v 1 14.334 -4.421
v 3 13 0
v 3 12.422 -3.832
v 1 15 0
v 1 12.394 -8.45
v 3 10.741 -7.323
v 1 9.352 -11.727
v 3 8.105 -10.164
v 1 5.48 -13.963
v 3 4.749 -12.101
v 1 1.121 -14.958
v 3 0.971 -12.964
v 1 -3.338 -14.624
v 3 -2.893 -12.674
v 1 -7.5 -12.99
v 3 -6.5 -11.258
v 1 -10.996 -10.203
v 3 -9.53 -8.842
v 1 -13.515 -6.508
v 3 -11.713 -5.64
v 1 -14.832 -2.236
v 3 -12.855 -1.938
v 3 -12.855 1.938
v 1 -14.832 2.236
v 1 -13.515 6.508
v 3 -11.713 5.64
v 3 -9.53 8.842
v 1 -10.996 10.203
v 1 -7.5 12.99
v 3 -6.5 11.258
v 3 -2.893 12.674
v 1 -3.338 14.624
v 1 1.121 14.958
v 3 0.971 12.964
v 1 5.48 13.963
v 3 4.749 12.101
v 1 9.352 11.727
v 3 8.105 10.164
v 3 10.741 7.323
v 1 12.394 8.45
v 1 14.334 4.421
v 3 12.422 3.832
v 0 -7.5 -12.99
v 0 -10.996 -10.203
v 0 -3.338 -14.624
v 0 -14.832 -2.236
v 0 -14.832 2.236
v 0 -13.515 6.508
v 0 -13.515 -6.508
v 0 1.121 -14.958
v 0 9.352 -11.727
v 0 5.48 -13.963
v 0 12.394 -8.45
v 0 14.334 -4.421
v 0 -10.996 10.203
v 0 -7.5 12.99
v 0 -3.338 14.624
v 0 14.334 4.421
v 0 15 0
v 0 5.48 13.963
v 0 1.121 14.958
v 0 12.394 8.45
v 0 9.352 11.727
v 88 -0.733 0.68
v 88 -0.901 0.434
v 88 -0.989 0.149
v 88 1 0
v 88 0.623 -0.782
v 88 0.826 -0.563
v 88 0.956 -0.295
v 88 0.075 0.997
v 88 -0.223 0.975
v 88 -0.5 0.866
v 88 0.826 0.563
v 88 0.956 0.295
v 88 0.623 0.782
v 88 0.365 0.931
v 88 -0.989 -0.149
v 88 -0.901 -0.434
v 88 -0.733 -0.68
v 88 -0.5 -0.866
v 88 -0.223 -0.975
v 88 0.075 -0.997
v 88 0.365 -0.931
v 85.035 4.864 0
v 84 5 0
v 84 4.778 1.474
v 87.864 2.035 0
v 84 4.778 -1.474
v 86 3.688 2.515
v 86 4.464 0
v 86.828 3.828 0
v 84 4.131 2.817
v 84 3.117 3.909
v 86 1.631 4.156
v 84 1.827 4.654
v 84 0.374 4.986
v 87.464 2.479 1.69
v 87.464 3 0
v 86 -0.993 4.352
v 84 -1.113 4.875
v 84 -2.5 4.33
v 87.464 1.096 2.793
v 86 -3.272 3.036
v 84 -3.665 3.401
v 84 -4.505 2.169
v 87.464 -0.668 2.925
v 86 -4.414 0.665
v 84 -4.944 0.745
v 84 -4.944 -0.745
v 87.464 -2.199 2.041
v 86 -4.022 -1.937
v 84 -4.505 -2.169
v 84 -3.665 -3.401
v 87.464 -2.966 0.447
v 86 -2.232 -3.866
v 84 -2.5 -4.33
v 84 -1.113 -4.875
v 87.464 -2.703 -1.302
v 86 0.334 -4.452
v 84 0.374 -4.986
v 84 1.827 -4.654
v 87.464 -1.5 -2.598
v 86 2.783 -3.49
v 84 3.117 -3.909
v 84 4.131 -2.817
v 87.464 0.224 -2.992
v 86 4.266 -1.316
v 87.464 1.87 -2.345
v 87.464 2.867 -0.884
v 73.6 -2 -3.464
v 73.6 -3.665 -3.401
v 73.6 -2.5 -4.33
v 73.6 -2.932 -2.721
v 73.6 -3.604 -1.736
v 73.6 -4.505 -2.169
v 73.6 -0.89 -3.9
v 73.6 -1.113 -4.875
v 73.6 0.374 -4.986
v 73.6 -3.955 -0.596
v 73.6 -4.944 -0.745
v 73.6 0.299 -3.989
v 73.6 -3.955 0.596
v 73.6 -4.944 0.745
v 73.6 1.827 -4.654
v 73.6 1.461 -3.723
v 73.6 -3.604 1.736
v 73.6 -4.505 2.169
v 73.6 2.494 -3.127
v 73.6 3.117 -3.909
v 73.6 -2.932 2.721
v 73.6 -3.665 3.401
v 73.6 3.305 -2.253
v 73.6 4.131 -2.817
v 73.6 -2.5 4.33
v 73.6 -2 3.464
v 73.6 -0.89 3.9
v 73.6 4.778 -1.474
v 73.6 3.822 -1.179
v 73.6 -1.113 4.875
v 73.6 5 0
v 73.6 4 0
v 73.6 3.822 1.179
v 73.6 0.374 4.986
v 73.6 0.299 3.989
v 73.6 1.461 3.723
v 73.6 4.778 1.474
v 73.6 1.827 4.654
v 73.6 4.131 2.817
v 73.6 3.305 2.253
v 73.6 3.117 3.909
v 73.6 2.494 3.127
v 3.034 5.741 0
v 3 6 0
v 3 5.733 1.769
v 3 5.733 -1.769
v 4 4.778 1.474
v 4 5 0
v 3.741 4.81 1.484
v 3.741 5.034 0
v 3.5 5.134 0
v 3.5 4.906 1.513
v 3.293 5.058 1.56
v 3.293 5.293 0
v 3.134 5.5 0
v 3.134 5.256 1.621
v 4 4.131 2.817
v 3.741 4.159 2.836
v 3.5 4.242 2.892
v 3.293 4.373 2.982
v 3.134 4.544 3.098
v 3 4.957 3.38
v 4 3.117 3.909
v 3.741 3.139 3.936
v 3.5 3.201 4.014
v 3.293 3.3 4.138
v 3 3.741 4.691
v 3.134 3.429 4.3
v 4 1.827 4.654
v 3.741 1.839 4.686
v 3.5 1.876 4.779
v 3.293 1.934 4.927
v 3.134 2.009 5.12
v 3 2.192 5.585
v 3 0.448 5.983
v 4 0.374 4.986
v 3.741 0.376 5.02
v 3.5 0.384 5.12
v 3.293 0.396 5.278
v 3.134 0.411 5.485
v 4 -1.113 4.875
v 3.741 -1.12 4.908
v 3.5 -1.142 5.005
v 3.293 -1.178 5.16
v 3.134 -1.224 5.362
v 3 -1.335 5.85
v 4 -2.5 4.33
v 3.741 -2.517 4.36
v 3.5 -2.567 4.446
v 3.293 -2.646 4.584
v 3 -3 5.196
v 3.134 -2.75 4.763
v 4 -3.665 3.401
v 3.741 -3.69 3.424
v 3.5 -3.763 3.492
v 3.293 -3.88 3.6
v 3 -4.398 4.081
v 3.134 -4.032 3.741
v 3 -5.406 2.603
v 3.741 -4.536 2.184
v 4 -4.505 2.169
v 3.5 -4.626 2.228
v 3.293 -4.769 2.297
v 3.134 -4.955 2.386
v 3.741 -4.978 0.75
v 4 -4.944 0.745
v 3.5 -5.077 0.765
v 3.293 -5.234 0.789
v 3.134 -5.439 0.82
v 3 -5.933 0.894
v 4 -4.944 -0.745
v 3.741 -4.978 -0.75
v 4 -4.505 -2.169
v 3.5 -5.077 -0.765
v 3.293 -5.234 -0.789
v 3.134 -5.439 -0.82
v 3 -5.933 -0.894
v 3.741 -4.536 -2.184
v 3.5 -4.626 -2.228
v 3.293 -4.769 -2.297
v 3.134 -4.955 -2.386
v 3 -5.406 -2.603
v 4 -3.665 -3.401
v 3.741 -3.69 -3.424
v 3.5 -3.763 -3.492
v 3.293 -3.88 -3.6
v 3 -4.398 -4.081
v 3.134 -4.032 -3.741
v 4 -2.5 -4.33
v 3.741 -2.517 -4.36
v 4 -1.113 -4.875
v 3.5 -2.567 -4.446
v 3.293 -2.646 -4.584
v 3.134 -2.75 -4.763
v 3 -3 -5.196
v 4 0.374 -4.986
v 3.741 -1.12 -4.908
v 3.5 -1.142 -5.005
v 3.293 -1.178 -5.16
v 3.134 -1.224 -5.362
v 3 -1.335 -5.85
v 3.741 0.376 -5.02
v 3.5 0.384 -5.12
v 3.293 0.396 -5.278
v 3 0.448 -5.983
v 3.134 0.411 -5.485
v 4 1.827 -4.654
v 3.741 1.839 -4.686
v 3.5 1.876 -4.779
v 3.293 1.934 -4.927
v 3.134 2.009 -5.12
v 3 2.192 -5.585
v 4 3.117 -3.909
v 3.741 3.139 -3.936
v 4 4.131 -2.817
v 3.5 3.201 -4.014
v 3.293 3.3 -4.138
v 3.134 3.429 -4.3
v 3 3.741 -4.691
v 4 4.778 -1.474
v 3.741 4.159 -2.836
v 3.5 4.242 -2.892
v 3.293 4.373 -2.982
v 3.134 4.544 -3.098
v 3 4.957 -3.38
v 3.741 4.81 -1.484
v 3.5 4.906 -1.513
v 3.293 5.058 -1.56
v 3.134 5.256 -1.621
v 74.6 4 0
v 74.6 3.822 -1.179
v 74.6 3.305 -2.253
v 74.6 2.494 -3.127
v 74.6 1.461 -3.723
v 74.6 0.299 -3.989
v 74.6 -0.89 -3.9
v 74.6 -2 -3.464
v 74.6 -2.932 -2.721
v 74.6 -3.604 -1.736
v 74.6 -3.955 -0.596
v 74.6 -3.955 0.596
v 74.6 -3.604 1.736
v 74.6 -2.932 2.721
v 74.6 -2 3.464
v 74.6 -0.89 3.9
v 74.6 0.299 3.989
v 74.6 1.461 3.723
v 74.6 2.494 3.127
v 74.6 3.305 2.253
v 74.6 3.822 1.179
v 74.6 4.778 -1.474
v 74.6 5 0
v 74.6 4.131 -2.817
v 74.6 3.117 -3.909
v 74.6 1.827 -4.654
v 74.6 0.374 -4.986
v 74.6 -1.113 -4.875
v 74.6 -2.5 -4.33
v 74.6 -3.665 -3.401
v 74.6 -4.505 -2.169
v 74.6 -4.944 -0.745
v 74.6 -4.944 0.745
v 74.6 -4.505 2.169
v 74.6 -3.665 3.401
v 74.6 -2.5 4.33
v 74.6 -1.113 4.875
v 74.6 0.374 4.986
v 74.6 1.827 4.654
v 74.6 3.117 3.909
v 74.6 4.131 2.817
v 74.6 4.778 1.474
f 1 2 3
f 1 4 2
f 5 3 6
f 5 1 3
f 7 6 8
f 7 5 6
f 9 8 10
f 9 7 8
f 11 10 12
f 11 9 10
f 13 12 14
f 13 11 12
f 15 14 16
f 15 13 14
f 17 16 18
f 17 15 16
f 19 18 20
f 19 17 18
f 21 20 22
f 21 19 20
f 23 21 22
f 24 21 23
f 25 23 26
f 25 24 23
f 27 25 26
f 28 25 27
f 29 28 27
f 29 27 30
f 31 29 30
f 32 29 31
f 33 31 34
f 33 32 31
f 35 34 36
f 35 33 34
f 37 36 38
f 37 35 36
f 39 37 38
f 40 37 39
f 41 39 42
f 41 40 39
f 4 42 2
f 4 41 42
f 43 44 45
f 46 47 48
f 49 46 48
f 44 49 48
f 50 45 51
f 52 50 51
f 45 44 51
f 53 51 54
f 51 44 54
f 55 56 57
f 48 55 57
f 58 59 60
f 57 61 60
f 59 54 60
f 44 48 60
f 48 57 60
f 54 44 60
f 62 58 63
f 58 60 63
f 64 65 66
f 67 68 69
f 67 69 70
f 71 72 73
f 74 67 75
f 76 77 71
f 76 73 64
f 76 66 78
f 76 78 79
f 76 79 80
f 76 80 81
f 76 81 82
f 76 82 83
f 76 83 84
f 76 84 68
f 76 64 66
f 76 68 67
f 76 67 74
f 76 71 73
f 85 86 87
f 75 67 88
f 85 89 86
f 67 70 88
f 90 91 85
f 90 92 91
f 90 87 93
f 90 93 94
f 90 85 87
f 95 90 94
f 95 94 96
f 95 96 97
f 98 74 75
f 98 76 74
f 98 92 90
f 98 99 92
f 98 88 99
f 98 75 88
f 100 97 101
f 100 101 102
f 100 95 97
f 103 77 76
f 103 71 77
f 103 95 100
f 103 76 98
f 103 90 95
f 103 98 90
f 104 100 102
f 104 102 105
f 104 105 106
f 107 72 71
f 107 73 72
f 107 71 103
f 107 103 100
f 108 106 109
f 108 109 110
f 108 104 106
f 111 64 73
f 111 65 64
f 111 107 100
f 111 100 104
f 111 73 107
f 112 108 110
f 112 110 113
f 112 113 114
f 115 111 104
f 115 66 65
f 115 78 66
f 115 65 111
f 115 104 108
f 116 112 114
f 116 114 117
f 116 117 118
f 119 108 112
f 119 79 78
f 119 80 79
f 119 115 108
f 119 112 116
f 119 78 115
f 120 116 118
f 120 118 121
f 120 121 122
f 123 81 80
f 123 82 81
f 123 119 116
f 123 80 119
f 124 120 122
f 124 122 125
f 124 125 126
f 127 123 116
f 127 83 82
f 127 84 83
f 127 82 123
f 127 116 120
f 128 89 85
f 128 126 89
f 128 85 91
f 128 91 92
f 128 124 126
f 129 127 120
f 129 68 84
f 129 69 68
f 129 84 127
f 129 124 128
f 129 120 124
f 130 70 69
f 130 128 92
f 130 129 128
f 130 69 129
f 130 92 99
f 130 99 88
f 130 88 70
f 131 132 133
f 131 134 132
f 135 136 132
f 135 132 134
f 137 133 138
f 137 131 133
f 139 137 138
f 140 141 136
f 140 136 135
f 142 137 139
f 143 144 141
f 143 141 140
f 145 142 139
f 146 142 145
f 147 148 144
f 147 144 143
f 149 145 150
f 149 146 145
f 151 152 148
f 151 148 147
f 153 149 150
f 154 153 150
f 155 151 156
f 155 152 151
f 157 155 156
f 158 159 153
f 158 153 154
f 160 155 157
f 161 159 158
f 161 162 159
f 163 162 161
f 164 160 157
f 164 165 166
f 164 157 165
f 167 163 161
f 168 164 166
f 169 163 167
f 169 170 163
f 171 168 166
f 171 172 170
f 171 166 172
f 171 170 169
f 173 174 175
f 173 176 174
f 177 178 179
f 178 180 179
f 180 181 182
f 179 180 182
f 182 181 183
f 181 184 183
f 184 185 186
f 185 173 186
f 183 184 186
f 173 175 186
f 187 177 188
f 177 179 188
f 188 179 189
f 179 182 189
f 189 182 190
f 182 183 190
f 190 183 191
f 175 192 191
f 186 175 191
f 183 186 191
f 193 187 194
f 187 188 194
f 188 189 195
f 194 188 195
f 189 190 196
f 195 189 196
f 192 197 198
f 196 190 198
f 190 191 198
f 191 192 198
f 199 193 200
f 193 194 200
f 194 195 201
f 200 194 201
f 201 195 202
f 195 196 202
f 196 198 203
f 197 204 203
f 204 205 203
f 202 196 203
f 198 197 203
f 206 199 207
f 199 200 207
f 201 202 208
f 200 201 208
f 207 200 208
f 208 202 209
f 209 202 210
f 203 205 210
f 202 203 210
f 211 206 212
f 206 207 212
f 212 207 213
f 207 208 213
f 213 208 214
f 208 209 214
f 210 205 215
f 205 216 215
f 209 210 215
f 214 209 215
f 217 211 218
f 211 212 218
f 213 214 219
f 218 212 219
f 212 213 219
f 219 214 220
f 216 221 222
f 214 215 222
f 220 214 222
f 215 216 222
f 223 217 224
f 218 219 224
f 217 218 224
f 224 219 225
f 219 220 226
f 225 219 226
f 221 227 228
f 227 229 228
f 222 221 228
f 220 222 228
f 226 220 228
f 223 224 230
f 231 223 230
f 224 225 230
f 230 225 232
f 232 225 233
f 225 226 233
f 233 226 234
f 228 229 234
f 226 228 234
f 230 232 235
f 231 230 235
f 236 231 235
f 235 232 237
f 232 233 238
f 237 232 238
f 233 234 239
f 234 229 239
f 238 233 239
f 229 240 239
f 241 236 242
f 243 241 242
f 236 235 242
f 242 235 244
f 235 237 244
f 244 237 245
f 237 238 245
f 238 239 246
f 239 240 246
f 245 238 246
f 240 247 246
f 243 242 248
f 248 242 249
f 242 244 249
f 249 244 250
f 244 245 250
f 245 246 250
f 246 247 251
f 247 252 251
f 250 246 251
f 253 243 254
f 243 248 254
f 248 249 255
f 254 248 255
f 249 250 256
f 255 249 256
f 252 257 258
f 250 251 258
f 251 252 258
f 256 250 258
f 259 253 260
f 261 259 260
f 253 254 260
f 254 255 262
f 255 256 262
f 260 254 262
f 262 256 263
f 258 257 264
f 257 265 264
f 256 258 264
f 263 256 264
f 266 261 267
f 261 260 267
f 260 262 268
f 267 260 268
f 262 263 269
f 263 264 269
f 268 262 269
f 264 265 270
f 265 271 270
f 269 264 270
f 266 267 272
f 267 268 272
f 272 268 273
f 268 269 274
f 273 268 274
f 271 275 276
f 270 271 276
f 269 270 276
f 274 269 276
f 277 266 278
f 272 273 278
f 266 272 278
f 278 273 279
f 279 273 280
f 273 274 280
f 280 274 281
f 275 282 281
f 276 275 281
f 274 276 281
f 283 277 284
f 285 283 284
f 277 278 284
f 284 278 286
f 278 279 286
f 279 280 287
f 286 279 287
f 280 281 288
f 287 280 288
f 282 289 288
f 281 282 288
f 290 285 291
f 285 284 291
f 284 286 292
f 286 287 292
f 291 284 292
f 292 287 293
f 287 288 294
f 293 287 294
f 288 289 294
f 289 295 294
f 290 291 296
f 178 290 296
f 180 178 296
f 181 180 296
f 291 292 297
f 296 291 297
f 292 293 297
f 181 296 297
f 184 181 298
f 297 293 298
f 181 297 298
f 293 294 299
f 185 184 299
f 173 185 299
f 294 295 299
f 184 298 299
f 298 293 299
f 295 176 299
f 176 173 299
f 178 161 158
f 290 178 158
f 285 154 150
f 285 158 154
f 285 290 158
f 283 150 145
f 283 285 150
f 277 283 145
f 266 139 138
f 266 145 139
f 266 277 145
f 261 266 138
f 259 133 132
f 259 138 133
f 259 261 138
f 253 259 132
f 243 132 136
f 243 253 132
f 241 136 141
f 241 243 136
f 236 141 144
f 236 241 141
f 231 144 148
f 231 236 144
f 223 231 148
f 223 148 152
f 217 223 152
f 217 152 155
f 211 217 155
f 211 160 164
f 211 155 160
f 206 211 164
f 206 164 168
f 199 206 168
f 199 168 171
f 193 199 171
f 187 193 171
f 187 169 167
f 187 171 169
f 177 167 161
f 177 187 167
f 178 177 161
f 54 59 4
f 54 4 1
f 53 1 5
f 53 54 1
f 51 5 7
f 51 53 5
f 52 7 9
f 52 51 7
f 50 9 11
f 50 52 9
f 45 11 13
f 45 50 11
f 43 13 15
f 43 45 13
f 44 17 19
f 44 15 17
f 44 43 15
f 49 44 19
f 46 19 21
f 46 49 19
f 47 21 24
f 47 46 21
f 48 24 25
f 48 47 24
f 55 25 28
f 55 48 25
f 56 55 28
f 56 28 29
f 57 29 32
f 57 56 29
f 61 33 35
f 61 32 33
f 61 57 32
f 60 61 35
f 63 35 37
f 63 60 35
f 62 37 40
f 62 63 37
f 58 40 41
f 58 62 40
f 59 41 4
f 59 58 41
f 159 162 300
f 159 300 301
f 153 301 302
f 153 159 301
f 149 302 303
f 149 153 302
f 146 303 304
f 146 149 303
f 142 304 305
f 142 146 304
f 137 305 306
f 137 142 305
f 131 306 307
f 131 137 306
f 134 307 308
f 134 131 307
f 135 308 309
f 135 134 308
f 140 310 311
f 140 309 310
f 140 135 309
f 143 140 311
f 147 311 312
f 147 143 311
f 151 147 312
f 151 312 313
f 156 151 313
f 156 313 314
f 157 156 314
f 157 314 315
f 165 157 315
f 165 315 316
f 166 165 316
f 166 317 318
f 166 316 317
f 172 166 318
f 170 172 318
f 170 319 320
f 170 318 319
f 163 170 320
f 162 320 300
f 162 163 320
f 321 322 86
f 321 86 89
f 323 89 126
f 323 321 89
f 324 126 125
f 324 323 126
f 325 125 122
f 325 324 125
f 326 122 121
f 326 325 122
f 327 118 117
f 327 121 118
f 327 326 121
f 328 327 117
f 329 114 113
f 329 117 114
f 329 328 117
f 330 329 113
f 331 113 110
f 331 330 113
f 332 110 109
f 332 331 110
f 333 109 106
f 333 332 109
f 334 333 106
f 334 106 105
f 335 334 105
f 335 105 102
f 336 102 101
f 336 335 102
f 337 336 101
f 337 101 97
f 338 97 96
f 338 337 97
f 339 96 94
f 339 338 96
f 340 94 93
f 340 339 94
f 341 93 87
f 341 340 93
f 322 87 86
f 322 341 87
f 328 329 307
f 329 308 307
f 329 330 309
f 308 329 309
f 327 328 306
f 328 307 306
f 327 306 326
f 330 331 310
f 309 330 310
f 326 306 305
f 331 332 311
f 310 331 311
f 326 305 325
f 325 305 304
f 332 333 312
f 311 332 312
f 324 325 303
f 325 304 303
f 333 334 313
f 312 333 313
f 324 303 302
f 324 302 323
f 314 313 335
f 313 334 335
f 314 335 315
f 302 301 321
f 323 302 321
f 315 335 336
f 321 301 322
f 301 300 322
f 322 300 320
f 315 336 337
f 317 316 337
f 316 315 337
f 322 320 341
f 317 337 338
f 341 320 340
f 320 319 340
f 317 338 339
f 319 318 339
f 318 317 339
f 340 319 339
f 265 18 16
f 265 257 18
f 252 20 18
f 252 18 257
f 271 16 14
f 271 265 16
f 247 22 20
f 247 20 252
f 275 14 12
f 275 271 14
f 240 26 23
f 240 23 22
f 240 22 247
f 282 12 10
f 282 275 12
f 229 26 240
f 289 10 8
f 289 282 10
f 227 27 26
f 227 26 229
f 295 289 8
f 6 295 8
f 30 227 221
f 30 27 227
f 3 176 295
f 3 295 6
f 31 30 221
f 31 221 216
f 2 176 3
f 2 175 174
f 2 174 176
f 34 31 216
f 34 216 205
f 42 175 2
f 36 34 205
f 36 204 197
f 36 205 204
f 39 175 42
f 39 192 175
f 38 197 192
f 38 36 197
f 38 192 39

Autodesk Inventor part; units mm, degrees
ref_plane "YZ Plane" through (0, 0, 0) normal (1, 0, 0) x (0, 1, 0)
ref_plane "XZ Plane" through (0, 0, 0) normal (0, 1, 0) x (-1, 0, 0)
ref_plane "XY Plane" through (0, 0, 0) normal (0, 0, 1) x (1, 0, 0)
sketch "Esboço1" plane through (0, 0, 0) normal (0, 0, 1) x (1, 0, 0)
  line L0 (0, 0) -> (88, 0)
  line L1 (88, 0) -> (88, 5)
  line L2 (88, 5) -> (3, 5)
  line L3 (3, 5) -> (3, 15)
  line L4 (3, 15) -> (0, 15)
  line L5 (0, 15) -> (0, 0)
  dimension "d0" = 88
  dimension "d1" = 5
  dimension "d2" = 3
  dimension "d3" = 15
revolve "Revolução1" add sketch "Esboço1" angle 360 about axis through (0, 0, 0) along (1, 0, 0)
chamfer "Chanfro1" distance 2 angle 45 1 edges at (3, -15, 0)
fillet "Arredondamento1" radius 4 1 edges at (88, -5, 0)
fillet "Arredondamento2" radius 1 1 edges at (3, -5, 0)
sketch "Esboço2" plane through (0, 0, 0) normal (0, 0, 1) x (1, 0, 0)
  line L0 (4, 5) -> (84, 5) projected
  line L1 (73.6, 5) -> (74.6, 5)
  line L2 (74.6, 5) -> (74.6, 4)
  line L3 (74.6, 4) -> (73.6, 4)
  line L4 (73.6, 4) -> (73.6, 5)
  line L5 (-17.6, 0) -> (105.6, 0) projected
  point P0 (0, 0)
  dimension "d10" = 1
  dimension "d11" = 4
  dimension "d12" = 73.6
revolve "Revolução2" cut sketch "Esboço2" angle 360 about axis through (-10, 0, 0) along (1, 0, 0)
